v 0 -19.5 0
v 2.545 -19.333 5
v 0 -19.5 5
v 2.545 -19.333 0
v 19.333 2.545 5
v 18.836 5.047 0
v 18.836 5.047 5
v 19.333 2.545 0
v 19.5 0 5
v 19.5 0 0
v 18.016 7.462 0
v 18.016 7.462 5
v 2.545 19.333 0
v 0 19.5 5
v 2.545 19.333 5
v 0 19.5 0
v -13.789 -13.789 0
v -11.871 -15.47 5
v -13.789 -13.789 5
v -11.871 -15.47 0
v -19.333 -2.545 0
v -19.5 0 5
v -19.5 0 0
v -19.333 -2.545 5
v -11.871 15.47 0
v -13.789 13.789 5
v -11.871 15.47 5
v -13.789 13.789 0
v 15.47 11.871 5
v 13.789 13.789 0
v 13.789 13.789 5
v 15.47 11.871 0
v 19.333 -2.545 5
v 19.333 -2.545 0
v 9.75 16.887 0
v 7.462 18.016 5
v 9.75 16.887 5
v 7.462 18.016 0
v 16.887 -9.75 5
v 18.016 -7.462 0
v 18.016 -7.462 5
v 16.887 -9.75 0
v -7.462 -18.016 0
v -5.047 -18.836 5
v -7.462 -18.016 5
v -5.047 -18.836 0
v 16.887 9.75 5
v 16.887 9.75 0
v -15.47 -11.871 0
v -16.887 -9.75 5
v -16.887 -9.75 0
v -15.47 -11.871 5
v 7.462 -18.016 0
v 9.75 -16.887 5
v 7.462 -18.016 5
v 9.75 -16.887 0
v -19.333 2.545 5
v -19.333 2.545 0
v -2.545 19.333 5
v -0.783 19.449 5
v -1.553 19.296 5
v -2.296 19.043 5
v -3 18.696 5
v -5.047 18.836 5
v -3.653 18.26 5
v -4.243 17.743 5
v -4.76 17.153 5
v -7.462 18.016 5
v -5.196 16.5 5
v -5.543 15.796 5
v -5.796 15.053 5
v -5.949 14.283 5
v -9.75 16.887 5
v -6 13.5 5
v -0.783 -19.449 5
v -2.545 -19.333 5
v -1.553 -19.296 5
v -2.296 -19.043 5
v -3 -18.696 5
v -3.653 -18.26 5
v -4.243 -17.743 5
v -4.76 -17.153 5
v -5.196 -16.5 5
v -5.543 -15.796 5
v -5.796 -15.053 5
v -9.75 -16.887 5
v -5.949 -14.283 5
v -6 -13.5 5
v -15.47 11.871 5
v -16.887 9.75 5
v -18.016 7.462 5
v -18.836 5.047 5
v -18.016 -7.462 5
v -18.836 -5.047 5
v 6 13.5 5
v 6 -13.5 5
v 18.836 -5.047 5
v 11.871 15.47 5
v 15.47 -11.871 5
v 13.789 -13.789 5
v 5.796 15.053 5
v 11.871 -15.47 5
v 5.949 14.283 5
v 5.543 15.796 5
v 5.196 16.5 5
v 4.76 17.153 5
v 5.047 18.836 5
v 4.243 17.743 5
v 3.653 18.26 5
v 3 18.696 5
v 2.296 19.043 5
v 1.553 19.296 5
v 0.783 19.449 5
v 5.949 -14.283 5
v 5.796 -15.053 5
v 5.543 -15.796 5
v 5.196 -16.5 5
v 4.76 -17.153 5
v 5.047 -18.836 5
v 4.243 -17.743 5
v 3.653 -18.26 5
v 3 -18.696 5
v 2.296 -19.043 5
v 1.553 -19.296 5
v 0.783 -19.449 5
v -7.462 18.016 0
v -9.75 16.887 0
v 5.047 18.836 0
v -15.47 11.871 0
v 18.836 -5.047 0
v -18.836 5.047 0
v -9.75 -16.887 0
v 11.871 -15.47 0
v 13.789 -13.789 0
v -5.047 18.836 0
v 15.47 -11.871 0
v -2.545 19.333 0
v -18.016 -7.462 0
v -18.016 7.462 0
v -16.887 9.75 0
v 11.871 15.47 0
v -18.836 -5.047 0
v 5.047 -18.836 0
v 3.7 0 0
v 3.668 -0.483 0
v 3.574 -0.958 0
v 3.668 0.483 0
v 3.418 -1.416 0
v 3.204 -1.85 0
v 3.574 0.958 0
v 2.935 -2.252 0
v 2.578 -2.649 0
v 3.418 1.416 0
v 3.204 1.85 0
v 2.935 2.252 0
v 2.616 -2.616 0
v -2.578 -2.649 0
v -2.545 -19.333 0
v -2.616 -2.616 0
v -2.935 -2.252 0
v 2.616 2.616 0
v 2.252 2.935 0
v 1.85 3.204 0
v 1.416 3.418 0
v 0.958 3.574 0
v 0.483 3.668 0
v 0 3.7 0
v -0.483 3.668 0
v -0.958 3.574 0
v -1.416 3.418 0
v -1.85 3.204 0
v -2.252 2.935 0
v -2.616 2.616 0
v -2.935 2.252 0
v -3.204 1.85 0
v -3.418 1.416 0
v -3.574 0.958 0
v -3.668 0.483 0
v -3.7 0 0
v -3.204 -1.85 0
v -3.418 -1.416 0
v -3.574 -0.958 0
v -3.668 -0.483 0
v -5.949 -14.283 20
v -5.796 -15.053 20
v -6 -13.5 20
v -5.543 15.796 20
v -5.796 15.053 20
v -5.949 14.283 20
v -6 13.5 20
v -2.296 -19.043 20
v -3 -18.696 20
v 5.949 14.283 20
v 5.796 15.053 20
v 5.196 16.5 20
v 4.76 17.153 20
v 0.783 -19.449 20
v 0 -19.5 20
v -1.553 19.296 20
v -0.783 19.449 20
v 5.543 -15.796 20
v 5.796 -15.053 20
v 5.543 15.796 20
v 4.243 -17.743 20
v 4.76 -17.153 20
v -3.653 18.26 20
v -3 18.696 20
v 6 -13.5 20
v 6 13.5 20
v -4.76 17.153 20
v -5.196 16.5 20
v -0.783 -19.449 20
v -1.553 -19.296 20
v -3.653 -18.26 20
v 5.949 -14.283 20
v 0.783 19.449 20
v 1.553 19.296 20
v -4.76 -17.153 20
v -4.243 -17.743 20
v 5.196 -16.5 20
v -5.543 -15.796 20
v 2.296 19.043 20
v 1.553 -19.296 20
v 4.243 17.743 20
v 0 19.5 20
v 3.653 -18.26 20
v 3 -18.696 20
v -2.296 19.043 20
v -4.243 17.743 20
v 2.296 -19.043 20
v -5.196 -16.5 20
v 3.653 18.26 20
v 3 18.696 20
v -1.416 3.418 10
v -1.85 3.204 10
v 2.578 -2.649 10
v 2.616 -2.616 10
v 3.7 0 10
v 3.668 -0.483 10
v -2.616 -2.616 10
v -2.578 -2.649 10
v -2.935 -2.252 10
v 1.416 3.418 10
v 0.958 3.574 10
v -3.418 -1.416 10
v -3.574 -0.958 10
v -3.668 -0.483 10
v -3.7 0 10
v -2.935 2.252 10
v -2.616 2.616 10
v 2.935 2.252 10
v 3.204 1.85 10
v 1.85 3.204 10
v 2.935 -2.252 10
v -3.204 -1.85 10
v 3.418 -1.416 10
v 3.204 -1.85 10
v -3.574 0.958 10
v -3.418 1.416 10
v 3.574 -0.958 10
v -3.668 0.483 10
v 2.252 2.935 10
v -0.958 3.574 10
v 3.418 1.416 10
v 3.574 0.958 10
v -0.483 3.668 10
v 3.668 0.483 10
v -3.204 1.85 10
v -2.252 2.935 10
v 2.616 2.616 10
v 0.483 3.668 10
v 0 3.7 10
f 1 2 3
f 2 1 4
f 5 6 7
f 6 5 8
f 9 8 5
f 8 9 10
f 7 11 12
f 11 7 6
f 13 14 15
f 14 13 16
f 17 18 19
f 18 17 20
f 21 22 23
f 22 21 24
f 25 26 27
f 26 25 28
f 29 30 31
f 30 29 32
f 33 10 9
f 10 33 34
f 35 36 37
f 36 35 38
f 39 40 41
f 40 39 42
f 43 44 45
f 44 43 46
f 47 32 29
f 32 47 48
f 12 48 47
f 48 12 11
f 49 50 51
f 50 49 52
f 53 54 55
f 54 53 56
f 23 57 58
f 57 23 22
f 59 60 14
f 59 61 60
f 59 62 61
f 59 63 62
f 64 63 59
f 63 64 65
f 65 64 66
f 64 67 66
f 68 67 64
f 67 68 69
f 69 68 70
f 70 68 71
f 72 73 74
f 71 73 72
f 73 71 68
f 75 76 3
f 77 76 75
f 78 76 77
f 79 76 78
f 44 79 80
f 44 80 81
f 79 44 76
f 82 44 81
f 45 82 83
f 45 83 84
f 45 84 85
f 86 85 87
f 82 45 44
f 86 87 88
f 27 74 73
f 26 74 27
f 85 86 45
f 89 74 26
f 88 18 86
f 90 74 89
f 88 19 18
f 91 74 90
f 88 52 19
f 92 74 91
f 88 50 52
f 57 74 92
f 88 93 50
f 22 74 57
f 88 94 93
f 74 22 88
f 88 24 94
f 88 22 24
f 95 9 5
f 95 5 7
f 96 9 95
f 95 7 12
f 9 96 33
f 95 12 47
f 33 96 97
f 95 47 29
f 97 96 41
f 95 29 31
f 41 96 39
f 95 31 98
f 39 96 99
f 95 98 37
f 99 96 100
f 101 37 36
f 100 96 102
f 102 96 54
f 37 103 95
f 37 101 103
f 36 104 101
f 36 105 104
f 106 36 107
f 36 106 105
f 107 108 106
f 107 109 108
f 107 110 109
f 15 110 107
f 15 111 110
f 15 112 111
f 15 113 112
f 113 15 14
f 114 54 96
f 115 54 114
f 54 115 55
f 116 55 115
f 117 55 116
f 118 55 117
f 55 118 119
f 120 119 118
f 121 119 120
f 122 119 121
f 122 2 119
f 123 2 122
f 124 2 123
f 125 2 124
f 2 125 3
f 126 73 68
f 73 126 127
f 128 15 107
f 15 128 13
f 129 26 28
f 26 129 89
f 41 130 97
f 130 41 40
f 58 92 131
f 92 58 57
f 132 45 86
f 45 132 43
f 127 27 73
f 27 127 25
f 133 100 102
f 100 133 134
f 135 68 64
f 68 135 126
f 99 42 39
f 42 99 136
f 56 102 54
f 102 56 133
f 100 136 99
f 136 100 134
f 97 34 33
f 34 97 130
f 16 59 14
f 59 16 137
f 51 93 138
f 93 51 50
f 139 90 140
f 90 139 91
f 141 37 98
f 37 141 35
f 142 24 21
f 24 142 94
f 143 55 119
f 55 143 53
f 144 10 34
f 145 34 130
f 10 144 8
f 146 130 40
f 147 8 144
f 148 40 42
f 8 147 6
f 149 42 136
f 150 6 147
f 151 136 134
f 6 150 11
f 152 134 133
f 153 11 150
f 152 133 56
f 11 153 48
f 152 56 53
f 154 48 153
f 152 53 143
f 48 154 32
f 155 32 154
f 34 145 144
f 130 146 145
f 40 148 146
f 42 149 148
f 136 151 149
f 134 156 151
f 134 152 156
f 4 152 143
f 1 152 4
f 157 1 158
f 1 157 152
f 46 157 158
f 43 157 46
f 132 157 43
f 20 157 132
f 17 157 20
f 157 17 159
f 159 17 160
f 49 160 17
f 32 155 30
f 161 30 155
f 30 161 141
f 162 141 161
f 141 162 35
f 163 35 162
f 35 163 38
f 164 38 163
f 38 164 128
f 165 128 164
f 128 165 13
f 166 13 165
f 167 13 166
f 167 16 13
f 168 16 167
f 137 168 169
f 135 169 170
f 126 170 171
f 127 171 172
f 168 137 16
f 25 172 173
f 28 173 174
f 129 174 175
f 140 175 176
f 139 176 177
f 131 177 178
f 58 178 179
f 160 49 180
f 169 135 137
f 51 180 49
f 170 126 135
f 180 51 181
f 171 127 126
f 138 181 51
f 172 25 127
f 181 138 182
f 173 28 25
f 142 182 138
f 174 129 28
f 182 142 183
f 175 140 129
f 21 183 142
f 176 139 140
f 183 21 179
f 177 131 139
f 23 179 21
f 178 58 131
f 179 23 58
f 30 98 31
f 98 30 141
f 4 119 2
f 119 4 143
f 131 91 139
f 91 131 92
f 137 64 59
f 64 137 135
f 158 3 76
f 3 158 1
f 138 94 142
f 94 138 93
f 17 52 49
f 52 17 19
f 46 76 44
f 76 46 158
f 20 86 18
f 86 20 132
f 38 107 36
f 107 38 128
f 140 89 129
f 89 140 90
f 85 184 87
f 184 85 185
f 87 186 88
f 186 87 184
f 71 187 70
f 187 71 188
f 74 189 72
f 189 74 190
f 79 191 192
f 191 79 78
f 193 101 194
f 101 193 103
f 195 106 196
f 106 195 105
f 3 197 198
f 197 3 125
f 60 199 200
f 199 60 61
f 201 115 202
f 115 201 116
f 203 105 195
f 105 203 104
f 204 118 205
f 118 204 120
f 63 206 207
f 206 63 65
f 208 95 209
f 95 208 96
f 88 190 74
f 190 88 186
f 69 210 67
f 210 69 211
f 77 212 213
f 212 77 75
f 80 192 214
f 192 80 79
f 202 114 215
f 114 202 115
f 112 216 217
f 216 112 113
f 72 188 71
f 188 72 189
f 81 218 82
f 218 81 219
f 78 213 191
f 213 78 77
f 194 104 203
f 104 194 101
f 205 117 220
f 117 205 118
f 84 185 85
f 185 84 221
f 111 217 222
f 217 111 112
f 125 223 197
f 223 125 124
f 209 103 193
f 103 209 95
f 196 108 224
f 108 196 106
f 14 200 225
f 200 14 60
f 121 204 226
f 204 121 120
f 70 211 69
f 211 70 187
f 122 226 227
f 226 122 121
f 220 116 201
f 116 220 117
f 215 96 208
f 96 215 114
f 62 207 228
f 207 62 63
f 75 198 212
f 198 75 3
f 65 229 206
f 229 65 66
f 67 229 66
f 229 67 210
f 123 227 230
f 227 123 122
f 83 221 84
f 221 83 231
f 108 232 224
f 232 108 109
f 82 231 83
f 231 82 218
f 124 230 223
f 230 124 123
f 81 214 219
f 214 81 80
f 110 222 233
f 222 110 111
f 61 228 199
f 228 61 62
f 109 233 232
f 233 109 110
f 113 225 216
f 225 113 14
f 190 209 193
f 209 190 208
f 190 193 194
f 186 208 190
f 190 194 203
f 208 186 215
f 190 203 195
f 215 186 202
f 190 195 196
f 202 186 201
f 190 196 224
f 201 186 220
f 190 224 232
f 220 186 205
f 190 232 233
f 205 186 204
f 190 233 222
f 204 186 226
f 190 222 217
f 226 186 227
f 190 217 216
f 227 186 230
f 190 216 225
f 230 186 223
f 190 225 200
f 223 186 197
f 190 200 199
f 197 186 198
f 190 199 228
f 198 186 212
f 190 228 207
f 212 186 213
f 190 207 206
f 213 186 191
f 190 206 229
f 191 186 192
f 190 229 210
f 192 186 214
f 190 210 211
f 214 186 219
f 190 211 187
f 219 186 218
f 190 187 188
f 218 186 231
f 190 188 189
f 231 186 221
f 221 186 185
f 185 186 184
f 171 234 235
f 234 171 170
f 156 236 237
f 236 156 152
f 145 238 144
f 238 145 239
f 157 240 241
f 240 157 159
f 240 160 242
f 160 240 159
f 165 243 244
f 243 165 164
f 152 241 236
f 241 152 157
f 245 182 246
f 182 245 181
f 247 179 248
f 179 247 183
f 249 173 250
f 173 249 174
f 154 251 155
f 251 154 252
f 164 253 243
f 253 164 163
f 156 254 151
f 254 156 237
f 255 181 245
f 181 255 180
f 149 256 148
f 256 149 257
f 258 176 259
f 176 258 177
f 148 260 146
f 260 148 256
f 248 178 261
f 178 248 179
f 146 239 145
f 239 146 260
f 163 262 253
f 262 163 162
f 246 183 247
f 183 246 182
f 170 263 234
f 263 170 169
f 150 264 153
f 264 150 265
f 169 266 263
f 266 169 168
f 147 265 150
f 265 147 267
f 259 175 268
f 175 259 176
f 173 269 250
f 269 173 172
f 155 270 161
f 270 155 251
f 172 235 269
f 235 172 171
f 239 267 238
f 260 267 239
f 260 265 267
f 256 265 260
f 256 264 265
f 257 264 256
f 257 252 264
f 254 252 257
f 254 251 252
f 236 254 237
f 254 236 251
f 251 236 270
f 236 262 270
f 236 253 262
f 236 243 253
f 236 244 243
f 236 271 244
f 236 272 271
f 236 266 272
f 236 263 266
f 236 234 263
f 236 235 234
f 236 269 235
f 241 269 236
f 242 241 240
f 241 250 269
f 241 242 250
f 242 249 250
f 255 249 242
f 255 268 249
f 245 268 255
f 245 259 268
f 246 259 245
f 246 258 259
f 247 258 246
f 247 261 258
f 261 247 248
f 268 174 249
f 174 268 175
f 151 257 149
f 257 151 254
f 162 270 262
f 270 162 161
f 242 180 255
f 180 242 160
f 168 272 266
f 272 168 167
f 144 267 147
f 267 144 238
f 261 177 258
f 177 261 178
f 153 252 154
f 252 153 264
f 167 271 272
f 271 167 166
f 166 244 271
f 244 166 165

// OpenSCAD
/*
  Simplified D-shaft knob
  Units: millimetres
*/

// ---------- Core dimensions ----------
knob_diameter = 39;       // circular base
base_height = 5;          // base thickness
knob_height = 20;         // total height
grip_width = 12;          // fin width
grip_length = 39;         // fin length
shaft_diameter = 7;       // D-post diameter
shaft_flat_chord = 5;     // flat width of the D
shaft_depth = 10;         // socket depth
socket_clearance = 0.2;   // print clearance for the bore

$fn = 48;

// ---------- Derived ----------
base_radius = knob_diameter / 2;
shaft_radius = shaft_diameter / 2;
grip_rise = knob_height - base_height;
nominal_flat_y = -sqrt(pow(shaft_radius, 2) - pow(shaft_flat_chord / 2, 2));
socket_flat_y = nominal_flat_y - socket_clearance;

// ---------- D-profile (flat on -Y, pointer on +Y) ----------
module d_profile() {
  r = shaft_radius + socket_clearance;
  difference() {
    circle(r = r);
    // Cut off the bottom to make the flat
    translate([-r, socket_flat_y - r])
      square([2 * r, r]);
  }
}

// ---------- Base ----------
module base() {
  cylinder(h = base_height, r = base_radius);
}

// ---------- Fin / Grip ----------
module fin() {
  r = grip_width / 2;
  straight = grip_length - grip_width;
  translate([0, 0, base_height])
    linear_extrude(height = grip_rise)
      hull() {
        translate([0, -straight / 2]) circle(r = r);
        translate([0,  straight / 2]) circle(r = r);
      }
}

// ---------- Assembly ----------
difference() {
  union() {
    base();
    fin();
  }
  linear_extrude(height = shaft_depth)
    d_profile();
}
